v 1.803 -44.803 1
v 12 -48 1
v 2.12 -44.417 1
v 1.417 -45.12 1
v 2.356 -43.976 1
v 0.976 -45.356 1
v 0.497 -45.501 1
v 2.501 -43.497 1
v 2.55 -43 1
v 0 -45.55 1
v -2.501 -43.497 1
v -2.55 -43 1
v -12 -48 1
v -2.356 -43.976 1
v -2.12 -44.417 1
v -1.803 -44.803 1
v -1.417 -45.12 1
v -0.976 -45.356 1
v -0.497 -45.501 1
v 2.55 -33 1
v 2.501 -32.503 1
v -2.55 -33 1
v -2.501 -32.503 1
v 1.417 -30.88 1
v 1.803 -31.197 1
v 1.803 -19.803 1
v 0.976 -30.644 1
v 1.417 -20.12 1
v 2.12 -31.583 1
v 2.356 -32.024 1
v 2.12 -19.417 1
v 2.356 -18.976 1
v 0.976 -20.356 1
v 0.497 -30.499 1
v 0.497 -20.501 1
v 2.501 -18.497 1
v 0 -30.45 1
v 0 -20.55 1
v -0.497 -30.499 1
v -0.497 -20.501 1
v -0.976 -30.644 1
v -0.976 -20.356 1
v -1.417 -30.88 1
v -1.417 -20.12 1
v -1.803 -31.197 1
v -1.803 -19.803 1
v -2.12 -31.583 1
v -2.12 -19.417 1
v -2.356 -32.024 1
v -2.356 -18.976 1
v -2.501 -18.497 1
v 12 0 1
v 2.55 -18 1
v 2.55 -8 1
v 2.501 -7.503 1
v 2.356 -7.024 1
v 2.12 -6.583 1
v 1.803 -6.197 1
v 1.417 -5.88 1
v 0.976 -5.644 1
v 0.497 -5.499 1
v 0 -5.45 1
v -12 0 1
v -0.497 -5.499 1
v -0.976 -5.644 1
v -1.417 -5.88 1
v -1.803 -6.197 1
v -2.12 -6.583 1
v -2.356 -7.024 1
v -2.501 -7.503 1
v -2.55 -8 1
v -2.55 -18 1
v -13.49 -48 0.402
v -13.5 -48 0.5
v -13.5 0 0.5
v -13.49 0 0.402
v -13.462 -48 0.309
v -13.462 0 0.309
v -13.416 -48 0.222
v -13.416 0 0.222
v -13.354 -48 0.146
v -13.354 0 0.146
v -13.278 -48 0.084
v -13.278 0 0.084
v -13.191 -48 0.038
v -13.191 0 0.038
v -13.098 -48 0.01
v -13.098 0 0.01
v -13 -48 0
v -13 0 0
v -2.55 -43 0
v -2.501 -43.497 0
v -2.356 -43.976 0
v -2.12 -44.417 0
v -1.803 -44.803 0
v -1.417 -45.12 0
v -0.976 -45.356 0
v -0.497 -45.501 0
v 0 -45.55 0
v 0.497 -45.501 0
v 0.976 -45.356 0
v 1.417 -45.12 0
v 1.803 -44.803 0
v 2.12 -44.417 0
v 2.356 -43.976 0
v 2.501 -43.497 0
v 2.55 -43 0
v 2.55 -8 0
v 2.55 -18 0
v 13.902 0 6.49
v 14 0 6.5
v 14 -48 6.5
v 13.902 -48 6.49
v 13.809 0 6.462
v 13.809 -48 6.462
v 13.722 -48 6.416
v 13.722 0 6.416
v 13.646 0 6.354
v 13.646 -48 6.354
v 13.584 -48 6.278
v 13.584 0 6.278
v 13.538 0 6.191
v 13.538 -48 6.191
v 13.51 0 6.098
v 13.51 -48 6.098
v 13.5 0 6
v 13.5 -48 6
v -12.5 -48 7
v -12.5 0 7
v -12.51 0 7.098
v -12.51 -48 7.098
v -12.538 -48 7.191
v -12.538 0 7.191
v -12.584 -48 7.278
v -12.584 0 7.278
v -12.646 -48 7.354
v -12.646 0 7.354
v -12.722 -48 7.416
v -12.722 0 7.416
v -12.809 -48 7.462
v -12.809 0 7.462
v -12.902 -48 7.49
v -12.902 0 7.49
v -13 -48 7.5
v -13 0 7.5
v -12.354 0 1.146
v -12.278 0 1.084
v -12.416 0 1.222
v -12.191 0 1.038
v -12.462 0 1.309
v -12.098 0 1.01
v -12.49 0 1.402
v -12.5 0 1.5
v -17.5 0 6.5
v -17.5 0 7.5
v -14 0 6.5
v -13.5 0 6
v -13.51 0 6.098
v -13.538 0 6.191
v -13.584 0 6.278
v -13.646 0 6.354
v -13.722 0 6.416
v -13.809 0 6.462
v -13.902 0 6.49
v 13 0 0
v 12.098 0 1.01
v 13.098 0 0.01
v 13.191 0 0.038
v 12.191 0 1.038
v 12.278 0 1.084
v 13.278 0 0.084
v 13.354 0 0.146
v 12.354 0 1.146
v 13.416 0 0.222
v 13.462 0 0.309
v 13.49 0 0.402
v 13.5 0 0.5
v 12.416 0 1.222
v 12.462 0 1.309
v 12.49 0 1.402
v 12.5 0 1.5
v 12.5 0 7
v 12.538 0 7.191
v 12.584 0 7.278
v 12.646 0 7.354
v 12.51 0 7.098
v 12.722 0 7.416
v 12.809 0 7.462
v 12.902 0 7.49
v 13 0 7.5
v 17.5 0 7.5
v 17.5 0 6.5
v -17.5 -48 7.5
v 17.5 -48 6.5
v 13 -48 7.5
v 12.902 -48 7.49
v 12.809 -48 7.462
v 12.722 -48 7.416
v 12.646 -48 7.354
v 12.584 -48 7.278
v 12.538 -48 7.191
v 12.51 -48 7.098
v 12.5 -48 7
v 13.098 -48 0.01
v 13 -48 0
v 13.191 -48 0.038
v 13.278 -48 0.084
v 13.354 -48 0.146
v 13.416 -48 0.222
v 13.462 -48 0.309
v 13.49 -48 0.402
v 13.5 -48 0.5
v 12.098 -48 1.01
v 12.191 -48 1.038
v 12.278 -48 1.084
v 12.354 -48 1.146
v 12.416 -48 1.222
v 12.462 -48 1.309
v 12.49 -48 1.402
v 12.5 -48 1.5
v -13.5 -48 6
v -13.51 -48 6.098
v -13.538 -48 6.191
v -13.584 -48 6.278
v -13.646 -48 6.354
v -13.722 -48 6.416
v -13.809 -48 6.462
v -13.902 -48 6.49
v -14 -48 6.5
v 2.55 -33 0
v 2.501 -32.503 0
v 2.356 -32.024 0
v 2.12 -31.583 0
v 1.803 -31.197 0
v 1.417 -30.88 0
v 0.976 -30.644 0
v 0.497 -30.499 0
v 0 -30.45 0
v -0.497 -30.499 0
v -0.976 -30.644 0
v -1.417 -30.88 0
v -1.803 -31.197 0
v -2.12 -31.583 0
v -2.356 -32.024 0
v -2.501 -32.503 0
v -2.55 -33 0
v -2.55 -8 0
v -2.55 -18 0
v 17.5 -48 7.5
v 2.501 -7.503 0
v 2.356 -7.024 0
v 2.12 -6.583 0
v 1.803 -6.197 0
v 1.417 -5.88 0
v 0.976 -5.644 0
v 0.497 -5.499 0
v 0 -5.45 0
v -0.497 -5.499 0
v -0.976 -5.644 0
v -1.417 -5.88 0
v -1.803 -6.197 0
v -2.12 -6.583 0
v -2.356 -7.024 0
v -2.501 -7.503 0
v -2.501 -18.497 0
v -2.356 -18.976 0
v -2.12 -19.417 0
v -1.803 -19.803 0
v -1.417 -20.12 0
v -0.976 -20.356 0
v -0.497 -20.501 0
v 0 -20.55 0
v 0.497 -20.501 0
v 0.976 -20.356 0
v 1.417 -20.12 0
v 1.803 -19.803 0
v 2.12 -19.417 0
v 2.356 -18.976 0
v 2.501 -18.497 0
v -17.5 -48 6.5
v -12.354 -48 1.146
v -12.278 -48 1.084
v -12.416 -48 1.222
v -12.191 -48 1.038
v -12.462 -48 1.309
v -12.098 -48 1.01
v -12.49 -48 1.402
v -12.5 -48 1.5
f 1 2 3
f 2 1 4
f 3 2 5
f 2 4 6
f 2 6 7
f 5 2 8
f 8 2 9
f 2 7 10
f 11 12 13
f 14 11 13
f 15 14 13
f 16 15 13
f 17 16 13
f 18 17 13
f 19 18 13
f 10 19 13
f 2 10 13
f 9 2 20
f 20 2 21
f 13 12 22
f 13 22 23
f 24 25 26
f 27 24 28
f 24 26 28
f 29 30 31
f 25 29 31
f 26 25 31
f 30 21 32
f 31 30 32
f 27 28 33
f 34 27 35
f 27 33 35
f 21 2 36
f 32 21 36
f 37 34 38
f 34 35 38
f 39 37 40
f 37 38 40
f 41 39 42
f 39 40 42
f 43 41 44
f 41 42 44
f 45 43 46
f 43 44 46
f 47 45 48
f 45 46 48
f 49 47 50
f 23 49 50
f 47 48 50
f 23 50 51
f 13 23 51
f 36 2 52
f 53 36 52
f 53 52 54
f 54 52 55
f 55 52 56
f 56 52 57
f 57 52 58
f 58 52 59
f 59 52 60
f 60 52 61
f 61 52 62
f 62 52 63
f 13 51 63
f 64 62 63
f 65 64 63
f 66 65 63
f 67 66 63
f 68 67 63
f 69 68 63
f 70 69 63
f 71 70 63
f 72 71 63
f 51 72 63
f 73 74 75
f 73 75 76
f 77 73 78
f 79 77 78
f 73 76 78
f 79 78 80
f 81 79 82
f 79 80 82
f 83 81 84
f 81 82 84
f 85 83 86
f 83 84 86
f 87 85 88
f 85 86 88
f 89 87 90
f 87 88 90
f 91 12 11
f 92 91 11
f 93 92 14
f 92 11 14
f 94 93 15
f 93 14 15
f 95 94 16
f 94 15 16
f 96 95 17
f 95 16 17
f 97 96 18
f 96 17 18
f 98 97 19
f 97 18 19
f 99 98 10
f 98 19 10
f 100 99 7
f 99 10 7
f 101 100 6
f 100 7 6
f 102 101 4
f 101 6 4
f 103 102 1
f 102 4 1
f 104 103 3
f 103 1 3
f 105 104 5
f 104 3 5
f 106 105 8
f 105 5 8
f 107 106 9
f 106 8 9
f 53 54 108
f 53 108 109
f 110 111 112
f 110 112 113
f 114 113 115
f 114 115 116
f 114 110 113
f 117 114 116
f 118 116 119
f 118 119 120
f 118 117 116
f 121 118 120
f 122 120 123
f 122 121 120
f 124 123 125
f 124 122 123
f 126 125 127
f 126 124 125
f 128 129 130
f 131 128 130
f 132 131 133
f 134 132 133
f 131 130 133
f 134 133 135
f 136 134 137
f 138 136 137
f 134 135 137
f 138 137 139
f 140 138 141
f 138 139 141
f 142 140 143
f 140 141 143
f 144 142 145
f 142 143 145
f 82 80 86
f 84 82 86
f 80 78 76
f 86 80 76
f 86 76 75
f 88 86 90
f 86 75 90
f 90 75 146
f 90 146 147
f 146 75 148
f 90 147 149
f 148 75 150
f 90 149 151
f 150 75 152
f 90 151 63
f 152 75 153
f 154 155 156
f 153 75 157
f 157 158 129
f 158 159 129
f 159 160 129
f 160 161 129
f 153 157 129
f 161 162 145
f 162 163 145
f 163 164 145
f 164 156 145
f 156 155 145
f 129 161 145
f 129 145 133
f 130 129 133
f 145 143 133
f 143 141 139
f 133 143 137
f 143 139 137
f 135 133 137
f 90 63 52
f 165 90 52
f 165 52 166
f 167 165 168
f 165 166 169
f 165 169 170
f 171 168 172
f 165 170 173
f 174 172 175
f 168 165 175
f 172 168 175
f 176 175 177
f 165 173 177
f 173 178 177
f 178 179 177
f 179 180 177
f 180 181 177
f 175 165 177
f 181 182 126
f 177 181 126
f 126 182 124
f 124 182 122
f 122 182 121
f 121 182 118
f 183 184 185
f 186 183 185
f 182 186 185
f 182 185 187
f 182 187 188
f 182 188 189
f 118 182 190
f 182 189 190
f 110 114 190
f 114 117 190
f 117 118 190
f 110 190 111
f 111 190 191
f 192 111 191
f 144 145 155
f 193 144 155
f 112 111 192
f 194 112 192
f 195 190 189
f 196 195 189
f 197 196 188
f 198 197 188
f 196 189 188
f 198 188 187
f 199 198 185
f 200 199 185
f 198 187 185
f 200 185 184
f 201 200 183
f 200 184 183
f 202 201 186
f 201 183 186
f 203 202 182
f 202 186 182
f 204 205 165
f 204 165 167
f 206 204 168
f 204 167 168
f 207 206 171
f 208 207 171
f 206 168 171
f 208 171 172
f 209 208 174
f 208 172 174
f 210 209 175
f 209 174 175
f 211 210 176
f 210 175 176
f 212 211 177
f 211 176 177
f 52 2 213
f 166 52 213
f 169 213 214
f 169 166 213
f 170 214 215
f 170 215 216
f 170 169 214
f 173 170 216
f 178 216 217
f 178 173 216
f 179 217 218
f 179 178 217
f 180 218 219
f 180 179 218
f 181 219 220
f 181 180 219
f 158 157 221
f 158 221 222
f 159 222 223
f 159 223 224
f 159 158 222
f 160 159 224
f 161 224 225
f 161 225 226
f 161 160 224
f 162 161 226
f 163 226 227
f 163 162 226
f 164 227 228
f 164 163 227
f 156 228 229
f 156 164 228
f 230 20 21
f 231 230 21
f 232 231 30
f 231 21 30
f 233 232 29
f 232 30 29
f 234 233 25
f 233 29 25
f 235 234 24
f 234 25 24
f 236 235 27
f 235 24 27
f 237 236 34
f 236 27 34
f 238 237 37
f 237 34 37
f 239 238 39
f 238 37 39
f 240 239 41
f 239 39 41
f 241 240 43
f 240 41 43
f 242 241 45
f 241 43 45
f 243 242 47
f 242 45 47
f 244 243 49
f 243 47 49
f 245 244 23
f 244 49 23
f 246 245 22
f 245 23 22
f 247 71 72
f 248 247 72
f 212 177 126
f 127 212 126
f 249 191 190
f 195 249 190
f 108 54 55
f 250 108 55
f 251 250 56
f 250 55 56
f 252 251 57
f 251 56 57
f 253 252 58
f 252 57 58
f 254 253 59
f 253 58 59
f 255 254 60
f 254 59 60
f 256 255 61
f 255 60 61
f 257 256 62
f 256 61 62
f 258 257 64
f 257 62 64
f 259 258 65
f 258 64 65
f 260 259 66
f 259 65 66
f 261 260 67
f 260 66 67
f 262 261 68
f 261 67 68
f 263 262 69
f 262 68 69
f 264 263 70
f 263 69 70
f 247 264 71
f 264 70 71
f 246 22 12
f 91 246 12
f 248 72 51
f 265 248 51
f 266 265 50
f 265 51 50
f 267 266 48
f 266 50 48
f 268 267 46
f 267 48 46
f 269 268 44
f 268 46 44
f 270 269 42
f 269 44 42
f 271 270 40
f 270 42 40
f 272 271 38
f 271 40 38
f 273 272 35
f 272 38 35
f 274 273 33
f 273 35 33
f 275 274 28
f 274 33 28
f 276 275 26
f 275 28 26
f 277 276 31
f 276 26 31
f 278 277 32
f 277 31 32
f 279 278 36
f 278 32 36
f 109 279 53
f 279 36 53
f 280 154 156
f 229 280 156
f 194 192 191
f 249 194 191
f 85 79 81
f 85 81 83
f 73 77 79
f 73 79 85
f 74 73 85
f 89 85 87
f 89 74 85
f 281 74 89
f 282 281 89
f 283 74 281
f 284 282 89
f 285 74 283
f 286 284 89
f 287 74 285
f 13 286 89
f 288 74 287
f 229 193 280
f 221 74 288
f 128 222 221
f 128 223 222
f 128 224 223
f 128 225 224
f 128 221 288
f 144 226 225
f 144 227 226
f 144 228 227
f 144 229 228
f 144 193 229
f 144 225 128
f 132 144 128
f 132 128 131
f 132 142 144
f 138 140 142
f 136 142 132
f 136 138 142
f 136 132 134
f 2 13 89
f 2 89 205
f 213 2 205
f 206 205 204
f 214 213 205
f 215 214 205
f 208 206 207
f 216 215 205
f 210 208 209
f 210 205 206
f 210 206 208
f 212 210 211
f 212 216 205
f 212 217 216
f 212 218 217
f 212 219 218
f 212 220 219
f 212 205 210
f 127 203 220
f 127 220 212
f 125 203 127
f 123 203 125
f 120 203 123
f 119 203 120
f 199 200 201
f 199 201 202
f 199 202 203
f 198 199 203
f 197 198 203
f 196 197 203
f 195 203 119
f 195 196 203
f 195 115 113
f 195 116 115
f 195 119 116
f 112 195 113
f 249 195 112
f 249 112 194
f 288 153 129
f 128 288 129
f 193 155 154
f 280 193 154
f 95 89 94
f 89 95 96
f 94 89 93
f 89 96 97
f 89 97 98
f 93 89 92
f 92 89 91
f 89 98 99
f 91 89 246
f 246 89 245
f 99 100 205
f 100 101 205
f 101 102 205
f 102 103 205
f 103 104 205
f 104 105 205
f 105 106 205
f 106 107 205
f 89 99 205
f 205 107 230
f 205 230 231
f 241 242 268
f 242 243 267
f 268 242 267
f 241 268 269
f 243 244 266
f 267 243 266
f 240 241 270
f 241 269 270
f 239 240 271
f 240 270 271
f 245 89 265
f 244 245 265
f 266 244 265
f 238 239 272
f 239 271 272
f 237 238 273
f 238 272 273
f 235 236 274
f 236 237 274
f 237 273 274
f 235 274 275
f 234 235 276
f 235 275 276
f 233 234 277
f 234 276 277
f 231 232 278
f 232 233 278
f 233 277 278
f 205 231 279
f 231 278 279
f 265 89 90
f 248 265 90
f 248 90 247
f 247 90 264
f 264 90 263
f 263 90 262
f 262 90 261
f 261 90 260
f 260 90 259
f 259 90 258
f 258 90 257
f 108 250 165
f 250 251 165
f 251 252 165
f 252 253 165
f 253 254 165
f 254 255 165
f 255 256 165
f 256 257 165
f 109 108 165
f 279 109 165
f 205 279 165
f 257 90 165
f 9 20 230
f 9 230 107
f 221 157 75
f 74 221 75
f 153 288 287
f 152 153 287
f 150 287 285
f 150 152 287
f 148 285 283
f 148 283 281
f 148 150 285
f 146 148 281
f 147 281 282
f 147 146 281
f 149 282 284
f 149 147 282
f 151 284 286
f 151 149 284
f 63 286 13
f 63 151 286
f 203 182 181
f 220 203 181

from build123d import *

# Parameters (mm, degrees)
PAD002_DEPTH    = 48
POCKET003_DEPTH = 5


with BuildPart() as pad002:
    # Sketch001 → Pad002 (new body)
    with BuildSketch(Plane.XZ):
        with BuildLine():
            Line((-17.5, 6.5), (-14, 6.5))
            ThreePointArc((-13.5, 6), (-13.646447, 6.353553), (-14, 6.5))
            Line((-13.5, 6), (-13.5, 0.5))
            ThreePointArc((-13.5, 0.5), (-13.353553, 0.146447), (-13, 0))
            Line((-13, 0), (13, 0))
            ThreePointArc((13, 0), (13.353553, 0.146447), (13.5, 0.5))
            Line((13.5, 0.5), (13.5, 6))
            ThreePointArc((14, 6.5), (13.646447, 6.353553), (13.5, 6))
            Line((14, 6.5), (17.5, 6.5))
            Line((17.5, 6.5), (17.5, 7.5))
            Line((17.5, 7.5), (13, 7.5))
            ThreePointArc((13, 7.5), (12.646447, 7.353553), (12.5, 7))
            Line((12.5, 7), (12.5, 1.5))
            ThreePointArc((12, 1), (12.353553, 1.146447), (12.5, 1.5))
            Line((12, 1), (-12, 1))
            ThreePointArc((-12.5, 1.5), (-12.353553, 1.146447), (-12, 1))
            Line((-12.5, 1.5), (-12.5, 7))
            ThreePointArc((-12.5, 7), (-12.646447, 7.353553), (-13, 7.5))
            Line((-13, 7.5), (-17.5, 7.5))
            Line((-17.5, 7.5), (-17.5, 6.5))
        make_face()
    extrude(amount=PAD002_DEPTH)


with BuildPart() as common:
    # Pocket003 base: copy of Pad002
    add(pad002.part)

    # Sketch002 (on Face19 of Pad002) → Pocket003 (cut)
    with BuildSketch(Plane(origin=(0, 0, 1), x_dir=(-1, 0, 0), z_dir=(0, 0, 1))):
        with BuildLine():
            ThreePointArc((-2.55, 33), (0, 30.45), (2.55, 33))
            Line((2.55, 33), (2.55, 43))
            ThreePointArc((2.55, 43), (0, 45.55), (-2.55, 43))
            Line((-2.55, 33), (-2.55, 43))
        make_face()
        with BuildLine():
            ThreePointArc((-2.55, 8), (0, 5.45), (2.55, 8))
            Line((2.55, 8), (2.55, 18))
            ThreePointArc((2.55, 18), (0, 20.55), (-2.55, 18))
            Line((-2.55, 8), (-2.55, 18))
        make_face()
    extrude(amount=-POCKET003_DEPTH, mode=Mode.SUBTRACT)

    # Common: intersect Pad002
    add(pad002.part, mode=Mode.INTERSECT)


solid = common.part
